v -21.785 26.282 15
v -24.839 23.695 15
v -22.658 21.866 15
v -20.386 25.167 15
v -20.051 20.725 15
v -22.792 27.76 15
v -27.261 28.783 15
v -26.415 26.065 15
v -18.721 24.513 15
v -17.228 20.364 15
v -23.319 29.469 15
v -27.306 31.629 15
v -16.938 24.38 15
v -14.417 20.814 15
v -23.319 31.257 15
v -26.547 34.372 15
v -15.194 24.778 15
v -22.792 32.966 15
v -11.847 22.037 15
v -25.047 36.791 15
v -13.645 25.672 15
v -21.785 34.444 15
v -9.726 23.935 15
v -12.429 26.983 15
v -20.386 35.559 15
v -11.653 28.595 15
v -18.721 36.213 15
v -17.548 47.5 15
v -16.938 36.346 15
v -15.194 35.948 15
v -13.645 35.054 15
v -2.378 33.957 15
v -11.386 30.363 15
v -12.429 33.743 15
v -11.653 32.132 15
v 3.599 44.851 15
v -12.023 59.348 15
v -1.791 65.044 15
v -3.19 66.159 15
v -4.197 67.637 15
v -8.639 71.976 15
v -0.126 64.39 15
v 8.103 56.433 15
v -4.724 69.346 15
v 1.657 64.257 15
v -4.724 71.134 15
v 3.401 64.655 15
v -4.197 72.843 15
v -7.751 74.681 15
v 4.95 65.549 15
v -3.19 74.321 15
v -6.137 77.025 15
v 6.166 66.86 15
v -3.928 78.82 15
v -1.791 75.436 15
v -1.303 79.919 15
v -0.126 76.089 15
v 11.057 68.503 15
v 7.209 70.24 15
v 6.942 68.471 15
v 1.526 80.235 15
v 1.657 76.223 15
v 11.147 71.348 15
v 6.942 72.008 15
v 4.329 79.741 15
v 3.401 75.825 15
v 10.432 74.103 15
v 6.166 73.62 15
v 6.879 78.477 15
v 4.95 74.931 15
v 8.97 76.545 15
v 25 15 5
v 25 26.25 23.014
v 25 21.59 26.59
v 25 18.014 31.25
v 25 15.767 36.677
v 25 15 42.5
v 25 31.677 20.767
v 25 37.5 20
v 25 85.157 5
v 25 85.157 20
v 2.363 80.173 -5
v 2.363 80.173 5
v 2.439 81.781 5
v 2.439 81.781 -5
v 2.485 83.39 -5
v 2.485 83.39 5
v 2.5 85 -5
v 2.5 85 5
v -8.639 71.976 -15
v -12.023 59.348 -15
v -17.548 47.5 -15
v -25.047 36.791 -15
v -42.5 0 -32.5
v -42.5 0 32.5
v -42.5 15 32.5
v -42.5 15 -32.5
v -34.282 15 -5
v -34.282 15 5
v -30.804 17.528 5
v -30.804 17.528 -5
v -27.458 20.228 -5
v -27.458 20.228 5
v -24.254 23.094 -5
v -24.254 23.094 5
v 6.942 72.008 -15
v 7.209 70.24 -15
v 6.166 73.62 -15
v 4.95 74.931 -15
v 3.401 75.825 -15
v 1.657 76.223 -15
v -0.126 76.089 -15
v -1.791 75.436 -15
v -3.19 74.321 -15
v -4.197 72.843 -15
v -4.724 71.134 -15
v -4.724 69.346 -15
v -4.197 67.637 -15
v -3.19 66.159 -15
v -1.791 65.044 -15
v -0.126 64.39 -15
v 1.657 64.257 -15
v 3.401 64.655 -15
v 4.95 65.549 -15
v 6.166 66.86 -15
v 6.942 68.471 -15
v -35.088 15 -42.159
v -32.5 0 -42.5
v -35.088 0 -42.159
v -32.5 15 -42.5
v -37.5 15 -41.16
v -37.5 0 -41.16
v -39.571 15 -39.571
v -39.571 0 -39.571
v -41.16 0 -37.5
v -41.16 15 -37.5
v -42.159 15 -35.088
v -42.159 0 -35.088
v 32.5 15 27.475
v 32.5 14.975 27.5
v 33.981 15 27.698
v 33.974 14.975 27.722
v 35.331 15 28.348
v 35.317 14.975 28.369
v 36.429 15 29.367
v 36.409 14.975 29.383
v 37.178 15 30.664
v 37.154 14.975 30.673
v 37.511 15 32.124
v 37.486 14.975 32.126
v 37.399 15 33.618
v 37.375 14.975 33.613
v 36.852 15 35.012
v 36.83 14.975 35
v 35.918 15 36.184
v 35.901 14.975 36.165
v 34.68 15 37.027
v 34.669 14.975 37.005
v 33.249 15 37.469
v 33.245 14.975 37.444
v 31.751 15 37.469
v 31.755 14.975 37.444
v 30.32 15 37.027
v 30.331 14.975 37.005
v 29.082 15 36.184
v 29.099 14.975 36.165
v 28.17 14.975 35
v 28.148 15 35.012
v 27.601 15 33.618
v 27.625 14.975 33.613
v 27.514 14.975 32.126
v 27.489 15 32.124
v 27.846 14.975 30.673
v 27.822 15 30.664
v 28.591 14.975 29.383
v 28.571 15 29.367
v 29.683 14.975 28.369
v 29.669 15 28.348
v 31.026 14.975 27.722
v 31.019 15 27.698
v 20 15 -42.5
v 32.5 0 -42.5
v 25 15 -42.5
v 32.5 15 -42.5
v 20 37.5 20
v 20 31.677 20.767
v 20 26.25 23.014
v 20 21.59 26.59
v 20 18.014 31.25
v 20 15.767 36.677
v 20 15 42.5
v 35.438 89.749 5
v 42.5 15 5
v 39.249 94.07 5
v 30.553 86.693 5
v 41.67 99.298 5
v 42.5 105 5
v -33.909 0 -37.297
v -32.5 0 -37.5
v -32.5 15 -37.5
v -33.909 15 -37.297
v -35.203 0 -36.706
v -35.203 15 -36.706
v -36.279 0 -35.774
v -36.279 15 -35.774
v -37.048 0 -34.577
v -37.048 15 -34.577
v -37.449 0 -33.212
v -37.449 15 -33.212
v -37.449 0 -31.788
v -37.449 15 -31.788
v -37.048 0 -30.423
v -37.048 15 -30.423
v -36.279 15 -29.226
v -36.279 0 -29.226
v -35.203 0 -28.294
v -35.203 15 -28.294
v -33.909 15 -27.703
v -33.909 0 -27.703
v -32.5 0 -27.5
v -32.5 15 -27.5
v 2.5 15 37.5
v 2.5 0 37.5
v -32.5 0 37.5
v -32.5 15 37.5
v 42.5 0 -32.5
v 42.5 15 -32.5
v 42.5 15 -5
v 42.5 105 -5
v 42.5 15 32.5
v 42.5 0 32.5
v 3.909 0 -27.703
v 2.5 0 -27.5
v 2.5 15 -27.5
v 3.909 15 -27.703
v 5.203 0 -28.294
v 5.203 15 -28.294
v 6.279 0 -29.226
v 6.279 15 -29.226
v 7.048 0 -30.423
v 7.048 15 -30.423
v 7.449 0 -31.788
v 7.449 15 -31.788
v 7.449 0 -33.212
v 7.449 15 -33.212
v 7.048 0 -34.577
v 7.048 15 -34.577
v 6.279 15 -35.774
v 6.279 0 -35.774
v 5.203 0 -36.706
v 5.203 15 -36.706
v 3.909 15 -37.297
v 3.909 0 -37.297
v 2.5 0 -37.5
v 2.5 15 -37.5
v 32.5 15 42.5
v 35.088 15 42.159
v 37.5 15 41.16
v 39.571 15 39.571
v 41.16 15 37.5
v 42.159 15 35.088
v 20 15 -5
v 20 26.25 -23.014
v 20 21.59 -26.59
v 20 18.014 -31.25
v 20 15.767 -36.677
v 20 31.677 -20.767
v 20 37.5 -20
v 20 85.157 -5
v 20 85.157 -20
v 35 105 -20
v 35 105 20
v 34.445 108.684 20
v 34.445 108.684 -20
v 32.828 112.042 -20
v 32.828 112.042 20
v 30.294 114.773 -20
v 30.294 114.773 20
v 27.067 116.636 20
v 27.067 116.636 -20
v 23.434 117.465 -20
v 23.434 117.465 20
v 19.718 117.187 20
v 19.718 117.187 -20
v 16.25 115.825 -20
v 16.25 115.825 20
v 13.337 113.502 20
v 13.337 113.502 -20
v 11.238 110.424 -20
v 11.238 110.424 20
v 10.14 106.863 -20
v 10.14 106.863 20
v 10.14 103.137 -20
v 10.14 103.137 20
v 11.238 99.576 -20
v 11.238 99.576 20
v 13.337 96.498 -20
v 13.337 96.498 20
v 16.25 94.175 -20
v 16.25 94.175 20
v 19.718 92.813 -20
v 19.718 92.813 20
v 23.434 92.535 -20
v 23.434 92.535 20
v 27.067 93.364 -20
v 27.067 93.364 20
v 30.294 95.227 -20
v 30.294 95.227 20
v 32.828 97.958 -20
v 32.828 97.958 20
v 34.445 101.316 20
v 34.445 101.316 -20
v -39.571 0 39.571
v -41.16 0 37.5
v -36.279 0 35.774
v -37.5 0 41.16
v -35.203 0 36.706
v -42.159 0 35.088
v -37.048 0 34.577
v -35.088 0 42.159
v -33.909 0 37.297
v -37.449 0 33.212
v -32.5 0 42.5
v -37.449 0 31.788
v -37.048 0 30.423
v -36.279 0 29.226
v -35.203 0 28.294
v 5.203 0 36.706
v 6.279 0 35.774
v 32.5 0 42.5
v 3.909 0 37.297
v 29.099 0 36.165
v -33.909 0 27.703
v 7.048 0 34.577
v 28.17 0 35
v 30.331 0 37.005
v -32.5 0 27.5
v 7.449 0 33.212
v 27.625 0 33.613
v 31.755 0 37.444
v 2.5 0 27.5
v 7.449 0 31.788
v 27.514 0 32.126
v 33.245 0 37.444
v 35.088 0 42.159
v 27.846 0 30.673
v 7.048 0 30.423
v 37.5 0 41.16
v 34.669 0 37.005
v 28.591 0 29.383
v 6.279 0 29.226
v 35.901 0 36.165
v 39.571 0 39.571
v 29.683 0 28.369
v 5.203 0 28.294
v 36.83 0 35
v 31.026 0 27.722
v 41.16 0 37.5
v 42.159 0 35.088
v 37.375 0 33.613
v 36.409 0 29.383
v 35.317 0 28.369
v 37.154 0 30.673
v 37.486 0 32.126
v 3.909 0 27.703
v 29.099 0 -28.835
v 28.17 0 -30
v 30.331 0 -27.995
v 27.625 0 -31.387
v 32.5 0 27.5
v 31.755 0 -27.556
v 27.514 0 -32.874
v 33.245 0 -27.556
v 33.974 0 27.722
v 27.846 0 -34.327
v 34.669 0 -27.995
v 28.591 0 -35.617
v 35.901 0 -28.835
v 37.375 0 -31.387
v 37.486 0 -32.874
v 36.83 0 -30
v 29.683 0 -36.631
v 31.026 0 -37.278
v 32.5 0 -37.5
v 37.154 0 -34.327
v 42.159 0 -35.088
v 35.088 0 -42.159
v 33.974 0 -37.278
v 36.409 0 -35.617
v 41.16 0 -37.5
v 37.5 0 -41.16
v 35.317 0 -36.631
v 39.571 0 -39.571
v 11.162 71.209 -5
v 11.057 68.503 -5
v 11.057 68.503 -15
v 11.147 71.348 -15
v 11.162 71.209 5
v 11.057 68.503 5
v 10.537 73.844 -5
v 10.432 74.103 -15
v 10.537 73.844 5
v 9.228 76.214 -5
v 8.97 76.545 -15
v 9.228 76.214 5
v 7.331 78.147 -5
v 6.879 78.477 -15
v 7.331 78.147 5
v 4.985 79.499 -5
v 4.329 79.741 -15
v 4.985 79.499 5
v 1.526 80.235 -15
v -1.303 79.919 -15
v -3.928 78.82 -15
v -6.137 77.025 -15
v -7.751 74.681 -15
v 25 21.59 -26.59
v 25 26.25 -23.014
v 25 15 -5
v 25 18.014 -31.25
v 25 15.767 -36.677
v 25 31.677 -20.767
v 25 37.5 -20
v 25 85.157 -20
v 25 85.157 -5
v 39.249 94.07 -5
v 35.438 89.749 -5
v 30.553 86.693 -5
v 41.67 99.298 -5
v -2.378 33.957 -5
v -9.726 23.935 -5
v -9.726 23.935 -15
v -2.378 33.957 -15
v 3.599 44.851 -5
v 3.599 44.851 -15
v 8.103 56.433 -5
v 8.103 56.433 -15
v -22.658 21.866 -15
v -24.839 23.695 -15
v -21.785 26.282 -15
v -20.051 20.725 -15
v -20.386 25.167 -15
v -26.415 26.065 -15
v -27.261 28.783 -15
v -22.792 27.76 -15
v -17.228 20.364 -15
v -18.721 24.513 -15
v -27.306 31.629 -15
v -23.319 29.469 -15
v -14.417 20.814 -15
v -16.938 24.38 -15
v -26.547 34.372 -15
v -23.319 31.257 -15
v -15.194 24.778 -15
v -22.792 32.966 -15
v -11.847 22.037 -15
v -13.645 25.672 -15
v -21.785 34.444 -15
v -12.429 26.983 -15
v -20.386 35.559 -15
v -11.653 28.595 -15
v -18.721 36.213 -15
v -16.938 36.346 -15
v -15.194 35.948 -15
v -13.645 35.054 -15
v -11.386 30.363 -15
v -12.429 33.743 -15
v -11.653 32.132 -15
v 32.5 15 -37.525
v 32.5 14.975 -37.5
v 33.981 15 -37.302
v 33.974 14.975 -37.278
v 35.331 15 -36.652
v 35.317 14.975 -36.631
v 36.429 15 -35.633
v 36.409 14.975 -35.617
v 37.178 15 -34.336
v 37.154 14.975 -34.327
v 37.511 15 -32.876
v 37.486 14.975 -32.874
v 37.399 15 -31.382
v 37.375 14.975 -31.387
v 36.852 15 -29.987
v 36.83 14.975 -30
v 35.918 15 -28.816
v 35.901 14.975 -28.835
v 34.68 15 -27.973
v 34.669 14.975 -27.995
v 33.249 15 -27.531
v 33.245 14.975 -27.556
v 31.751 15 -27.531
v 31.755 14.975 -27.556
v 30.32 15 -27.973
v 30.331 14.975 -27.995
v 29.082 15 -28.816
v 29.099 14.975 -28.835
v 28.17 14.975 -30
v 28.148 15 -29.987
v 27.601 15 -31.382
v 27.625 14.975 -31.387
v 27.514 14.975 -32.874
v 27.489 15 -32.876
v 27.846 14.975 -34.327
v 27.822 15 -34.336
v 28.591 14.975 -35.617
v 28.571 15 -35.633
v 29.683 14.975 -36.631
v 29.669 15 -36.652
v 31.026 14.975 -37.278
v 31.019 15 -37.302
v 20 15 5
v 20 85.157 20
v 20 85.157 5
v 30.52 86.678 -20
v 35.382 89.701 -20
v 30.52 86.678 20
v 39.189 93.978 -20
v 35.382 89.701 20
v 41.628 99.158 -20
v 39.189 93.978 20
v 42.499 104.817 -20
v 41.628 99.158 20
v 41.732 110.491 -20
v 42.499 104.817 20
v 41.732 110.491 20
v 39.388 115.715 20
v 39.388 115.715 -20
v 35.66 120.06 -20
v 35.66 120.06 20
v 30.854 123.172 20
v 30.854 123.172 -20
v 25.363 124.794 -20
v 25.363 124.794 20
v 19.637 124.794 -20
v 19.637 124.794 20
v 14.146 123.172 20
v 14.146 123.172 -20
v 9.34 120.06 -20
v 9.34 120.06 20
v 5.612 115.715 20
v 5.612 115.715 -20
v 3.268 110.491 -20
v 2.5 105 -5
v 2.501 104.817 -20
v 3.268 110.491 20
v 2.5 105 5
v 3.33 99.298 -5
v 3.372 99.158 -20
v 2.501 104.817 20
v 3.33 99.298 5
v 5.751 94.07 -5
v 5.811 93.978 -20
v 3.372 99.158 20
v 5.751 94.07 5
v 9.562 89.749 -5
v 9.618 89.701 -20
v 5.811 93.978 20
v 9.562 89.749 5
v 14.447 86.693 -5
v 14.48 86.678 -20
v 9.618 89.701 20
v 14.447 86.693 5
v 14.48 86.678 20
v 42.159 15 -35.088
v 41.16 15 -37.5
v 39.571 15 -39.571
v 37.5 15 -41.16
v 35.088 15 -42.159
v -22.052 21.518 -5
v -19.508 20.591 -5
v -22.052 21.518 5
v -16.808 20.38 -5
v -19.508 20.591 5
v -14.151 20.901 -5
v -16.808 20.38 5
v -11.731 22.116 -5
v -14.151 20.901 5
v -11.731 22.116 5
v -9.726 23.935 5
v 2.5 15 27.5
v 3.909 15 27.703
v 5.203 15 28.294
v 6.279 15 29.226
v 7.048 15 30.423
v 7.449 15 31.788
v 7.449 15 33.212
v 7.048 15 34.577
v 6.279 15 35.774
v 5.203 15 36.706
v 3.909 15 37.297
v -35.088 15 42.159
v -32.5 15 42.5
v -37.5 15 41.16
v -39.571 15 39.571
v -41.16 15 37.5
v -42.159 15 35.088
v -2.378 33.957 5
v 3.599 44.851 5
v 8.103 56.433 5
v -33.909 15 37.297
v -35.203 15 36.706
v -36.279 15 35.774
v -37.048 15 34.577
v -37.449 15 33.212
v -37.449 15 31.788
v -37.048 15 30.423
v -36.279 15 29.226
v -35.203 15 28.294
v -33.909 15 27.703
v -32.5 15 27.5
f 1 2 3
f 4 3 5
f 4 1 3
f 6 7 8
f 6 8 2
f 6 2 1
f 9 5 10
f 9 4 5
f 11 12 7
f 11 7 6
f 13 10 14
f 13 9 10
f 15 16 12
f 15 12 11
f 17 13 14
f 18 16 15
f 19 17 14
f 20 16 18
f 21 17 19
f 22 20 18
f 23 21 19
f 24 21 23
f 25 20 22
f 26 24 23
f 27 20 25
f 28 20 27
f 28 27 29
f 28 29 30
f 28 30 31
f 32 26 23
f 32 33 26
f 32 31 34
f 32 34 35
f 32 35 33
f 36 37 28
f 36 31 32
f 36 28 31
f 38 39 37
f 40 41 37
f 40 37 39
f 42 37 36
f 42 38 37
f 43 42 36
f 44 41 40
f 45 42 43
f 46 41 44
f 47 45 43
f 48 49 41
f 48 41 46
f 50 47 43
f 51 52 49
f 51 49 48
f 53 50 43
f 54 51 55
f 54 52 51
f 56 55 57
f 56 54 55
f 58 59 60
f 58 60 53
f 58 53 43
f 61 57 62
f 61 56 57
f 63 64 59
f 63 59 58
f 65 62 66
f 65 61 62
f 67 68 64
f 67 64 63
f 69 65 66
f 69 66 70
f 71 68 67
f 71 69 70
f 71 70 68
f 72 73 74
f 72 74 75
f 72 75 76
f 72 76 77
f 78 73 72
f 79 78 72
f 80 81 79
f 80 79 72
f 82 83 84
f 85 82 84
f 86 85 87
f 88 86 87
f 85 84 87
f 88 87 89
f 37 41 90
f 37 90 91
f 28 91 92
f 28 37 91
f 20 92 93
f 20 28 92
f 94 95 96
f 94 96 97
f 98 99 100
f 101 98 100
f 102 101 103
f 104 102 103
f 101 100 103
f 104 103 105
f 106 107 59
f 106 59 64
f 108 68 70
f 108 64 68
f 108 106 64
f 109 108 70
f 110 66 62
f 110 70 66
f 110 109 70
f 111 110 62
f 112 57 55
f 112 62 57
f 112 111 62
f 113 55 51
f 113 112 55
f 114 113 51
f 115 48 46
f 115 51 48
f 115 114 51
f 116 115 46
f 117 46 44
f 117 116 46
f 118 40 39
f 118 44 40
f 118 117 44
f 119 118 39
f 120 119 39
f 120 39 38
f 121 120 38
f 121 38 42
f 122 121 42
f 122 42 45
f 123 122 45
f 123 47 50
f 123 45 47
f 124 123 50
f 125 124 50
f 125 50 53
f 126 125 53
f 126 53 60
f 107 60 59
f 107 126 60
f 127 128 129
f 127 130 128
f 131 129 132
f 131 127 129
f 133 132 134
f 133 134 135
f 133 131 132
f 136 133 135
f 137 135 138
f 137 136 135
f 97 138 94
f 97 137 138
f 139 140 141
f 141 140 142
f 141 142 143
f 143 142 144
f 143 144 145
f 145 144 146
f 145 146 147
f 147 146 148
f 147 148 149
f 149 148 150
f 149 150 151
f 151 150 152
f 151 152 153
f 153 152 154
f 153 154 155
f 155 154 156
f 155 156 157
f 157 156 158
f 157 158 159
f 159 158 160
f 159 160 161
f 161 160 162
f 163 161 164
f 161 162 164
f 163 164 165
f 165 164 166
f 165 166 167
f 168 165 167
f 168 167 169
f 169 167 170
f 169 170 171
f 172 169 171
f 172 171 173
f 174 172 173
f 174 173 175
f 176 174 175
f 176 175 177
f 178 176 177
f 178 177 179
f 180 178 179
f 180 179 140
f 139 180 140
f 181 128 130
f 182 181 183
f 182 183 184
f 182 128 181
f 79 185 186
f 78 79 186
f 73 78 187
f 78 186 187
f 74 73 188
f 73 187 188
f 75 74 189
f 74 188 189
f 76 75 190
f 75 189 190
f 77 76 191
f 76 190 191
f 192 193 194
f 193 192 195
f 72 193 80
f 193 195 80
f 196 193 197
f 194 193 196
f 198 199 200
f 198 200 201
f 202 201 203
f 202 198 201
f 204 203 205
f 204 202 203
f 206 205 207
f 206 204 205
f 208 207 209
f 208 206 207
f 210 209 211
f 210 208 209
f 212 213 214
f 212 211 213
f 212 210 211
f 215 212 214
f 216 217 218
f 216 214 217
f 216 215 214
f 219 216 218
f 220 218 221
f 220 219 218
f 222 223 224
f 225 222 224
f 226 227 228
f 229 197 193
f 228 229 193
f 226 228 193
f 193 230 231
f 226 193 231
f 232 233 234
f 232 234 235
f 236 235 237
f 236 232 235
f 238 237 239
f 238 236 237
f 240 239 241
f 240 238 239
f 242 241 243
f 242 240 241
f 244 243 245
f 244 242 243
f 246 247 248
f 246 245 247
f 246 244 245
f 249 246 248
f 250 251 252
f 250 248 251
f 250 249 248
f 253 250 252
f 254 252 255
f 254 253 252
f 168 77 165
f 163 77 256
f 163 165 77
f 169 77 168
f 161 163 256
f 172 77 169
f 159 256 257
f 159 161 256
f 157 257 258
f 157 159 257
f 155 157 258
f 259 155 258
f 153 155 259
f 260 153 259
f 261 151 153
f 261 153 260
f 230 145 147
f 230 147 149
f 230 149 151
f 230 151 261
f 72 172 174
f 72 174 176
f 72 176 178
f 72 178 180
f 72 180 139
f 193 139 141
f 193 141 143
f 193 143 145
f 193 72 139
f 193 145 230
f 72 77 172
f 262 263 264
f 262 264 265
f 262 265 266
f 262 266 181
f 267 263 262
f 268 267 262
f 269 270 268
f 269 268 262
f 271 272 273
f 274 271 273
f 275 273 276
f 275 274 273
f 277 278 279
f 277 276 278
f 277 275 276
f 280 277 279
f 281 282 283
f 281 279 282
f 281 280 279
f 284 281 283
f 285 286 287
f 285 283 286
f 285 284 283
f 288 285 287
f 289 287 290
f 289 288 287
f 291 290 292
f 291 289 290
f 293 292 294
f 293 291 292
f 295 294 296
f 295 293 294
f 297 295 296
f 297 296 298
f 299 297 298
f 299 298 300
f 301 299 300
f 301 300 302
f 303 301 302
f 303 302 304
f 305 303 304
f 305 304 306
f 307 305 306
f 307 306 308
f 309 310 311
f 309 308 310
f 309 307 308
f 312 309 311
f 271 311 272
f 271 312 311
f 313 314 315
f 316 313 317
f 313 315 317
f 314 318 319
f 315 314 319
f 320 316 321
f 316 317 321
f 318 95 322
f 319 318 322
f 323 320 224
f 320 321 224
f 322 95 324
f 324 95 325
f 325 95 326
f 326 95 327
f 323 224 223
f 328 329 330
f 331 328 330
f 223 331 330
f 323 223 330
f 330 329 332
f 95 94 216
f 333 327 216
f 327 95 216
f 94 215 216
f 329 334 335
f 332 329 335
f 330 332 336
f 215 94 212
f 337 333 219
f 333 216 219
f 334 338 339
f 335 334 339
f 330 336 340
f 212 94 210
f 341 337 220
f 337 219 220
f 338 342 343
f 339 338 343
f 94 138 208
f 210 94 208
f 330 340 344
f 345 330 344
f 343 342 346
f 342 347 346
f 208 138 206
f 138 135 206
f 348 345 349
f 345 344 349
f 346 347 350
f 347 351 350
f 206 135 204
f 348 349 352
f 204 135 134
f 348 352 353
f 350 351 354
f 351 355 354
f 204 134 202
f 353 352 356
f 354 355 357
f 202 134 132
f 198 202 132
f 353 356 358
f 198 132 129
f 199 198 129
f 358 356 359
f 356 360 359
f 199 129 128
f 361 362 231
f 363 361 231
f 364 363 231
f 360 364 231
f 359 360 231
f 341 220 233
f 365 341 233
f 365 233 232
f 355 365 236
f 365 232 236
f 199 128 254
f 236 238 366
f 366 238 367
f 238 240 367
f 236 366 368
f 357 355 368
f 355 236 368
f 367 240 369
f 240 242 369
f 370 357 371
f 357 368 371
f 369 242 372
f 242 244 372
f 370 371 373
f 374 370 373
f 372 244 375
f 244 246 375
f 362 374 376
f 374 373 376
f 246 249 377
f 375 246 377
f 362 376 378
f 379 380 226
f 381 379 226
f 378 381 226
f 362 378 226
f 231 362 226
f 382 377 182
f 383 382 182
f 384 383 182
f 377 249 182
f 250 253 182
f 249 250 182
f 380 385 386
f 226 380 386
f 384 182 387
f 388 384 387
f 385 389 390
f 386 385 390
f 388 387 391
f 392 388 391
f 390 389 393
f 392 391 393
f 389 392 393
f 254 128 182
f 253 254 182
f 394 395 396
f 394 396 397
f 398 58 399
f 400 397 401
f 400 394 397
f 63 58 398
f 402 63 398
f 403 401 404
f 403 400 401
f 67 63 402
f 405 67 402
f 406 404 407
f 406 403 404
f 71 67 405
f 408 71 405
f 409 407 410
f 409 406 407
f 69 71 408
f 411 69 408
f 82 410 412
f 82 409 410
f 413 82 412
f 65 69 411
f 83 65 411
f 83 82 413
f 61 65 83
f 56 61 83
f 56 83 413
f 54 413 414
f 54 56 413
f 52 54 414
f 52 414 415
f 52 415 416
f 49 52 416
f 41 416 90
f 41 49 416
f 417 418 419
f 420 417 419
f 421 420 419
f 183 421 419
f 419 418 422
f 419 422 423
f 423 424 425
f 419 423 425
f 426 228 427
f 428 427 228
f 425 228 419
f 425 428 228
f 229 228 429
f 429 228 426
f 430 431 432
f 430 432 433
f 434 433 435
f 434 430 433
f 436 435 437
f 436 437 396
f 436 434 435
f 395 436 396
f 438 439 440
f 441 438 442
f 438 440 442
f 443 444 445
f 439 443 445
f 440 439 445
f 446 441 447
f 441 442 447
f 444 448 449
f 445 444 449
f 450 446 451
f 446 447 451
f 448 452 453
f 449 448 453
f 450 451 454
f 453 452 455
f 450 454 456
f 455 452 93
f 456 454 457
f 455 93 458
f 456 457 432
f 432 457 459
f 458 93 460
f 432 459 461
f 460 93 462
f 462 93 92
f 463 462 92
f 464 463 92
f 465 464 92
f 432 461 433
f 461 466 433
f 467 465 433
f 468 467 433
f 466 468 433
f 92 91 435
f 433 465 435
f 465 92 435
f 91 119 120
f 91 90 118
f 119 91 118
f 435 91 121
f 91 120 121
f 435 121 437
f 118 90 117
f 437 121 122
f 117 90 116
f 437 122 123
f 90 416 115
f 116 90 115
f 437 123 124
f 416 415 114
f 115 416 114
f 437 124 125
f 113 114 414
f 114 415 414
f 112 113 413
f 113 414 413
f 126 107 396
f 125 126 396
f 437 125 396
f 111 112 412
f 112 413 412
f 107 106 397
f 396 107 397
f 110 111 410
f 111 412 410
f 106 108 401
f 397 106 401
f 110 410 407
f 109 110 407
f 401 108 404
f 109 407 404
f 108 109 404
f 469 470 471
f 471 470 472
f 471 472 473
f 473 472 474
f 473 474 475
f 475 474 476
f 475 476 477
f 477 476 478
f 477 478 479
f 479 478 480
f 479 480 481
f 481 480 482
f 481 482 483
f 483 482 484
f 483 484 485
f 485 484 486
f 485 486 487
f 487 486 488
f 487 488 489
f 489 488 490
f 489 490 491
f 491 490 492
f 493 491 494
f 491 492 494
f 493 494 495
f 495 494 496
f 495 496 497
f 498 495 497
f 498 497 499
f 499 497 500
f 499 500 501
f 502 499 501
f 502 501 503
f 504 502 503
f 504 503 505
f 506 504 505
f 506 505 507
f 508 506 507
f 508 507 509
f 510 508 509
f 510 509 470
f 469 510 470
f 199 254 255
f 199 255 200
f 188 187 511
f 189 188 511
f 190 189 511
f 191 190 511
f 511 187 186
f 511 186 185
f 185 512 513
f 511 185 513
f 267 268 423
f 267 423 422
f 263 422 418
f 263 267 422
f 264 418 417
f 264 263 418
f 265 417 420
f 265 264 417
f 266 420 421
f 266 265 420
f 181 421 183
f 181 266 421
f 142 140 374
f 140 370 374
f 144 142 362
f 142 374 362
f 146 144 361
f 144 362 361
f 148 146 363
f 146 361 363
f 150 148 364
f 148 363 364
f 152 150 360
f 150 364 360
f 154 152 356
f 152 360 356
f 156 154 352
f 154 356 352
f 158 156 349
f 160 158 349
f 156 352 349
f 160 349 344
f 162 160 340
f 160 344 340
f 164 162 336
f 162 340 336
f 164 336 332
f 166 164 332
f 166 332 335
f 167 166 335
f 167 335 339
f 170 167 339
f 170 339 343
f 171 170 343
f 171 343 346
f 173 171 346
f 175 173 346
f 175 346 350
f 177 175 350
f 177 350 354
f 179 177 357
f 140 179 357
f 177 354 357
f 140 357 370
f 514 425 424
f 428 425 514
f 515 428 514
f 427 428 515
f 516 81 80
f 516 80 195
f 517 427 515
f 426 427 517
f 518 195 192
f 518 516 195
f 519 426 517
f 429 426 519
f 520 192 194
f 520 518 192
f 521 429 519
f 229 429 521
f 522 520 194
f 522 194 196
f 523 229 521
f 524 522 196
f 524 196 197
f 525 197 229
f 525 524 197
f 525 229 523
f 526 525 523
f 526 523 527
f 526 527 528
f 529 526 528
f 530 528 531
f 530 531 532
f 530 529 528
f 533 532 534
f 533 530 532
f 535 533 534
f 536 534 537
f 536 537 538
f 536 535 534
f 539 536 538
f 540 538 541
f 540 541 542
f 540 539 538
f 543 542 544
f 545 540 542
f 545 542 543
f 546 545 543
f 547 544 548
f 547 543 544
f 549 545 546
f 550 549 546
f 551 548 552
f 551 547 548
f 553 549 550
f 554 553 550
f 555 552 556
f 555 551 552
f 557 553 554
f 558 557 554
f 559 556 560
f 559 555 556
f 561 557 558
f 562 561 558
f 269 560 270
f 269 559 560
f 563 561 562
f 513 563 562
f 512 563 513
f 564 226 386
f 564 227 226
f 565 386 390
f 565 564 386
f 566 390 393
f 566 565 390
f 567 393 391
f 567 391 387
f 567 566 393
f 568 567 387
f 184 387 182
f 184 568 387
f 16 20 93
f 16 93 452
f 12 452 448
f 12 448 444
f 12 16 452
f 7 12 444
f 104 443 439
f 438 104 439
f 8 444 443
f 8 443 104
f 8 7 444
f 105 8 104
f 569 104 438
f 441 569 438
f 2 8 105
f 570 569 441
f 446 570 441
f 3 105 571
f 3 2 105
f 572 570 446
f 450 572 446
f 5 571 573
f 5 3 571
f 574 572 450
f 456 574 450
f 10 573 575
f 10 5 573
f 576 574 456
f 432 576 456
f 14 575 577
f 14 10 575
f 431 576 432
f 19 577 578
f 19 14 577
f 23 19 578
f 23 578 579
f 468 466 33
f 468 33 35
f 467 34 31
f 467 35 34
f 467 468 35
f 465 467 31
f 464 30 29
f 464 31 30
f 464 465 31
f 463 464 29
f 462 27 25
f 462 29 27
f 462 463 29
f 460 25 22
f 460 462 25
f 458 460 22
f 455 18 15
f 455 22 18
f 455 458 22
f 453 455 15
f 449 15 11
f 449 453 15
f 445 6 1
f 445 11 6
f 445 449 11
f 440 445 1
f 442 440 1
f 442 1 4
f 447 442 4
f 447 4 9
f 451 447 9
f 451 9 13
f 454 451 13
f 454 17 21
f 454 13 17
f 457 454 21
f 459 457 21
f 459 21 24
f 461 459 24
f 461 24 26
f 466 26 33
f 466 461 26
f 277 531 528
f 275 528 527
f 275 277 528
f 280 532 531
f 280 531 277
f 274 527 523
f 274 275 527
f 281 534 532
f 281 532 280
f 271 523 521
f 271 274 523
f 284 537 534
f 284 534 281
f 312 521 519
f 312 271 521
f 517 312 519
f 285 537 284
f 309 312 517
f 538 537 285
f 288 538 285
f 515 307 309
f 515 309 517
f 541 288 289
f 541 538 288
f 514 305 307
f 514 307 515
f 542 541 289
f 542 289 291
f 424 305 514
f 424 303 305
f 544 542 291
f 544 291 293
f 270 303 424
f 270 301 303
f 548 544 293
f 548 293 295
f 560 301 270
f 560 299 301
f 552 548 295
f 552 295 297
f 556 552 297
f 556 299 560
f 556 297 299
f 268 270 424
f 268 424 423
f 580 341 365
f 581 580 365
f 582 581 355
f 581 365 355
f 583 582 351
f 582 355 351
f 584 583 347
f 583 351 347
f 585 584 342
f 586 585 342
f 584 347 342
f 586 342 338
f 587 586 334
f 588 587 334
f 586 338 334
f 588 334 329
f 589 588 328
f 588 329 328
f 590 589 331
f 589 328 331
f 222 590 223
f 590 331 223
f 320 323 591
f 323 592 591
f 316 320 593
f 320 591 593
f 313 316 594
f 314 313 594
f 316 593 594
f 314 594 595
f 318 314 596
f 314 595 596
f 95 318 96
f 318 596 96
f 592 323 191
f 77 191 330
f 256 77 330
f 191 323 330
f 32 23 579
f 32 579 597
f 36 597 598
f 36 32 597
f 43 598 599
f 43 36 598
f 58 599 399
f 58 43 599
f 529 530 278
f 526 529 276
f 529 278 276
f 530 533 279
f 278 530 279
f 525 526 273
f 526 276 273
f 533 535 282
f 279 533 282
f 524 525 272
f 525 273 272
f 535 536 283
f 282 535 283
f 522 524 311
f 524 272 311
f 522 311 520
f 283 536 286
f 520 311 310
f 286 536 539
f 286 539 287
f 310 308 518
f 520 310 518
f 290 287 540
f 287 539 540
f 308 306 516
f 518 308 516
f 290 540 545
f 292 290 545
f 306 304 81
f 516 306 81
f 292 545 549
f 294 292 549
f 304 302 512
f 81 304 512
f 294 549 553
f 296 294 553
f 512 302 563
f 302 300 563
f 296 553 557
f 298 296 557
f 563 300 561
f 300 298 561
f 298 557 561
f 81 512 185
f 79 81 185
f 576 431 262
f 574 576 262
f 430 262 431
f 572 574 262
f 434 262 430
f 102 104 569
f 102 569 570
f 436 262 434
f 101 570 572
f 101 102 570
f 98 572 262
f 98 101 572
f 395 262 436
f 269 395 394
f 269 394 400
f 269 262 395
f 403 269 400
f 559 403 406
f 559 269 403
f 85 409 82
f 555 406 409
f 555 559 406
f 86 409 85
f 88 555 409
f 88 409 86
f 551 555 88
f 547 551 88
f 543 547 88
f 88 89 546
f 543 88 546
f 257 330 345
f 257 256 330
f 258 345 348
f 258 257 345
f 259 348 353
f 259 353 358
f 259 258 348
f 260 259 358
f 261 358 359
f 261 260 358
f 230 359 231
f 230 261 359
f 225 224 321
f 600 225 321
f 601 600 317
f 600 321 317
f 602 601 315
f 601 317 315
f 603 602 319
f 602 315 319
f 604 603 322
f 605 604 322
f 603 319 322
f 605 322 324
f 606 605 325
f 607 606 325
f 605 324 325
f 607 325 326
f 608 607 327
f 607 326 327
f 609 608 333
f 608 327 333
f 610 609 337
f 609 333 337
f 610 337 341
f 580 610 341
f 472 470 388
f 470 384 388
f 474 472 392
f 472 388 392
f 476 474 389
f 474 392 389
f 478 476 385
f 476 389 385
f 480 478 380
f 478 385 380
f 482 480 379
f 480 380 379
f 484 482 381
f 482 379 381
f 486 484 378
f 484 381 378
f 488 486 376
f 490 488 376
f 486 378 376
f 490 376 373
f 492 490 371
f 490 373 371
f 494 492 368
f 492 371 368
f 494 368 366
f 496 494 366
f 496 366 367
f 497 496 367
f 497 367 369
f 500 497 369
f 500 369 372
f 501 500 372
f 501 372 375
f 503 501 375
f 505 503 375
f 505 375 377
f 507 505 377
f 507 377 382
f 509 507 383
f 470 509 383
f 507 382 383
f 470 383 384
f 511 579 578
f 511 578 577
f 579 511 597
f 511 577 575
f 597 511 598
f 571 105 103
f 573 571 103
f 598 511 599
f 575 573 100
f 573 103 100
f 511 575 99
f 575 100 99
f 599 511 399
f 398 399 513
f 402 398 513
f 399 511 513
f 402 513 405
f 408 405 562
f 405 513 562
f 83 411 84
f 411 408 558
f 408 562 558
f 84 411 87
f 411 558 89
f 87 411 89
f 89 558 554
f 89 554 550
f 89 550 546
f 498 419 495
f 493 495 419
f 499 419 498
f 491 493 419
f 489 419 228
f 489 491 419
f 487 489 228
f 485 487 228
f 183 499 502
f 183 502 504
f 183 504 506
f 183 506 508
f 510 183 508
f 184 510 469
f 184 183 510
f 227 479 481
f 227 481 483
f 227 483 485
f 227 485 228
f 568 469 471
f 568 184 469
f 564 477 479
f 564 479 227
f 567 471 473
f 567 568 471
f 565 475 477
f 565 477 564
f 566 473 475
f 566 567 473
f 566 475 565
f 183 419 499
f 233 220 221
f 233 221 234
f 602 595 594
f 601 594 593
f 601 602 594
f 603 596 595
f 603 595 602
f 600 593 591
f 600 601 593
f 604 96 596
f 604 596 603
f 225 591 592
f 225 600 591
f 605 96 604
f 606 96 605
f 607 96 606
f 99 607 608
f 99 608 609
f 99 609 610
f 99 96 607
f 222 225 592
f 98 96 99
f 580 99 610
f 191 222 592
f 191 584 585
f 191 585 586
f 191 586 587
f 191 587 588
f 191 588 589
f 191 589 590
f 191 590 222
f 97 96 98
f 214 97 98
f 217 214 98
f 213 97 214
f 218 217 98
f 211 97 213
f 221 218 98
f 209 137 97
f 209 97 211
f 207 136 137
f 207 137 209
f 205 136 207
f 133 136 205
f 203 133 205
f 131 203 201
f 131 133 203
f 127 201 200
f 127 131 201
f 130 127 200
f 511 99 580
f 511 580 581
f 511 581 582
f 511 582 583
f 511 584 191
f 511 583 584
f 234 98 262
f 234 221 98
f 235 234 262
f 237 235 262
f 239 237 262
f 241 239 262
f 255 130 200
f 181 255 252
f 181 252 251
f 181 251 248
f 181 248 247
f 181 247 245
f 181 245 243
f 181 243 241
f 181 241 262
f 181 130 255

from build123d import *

# Parameters (mm, degrees)
SKETCH1_W                            = 85
SKETCH1_H                            = 85
BOSS_EXTRUDE1_DEPTH                  = 15
SKETCH2_R                            = 20
BOSS_EXTRUDE2_DEPTH                  = 20
BOSS_EXTRUDE3_DEPTH                  = 5
BOSS_EXTRUDE4_DEPTH                  = 15
RIB1_START                           = -2.5
RIB1_DEPTH                           = 5
FILLET1_R                            = 10
F_10_0_10_DIAMETER_HOLE1_D           = 10
F_10_0_10_DIAMETER_HOLE1_CSINK_D     = 10.05
F_10_0_10_DIAMETER_HOLE1_CSINK_ANGLE = 90
CUT_EXTRUDE1_DEPTH                   = 126.349511367
CUT_EXTRUDE1_DEPTH_BACK              = 126.349511367
CUT_EXTRUDE2_DEPTH                   = 145.005208239
CUT_EXTRUDE2_DEPTH_BACK              = 145.005208239
SKETCH9_R                            = 12.5
SKETCH9_R_2                          = 6


with BuildPart() as part:
    # Sketch1 → Boss-Extrude1 (new body)
    with BuildSketch(Plane(origin=(0, 0, 0), x_dir=(1, 0, 0), z_dir=(0, 1, 0))):
        Rectangle(SKETCH1_W, SKETCH1_H)
    extrude(amount=BOSS_EXTRUDE1_DEPTH)



with BuildPart() as body_2:
    # Sketch2 → Boss-Extrude2 (new, symmetric)
    with BuildSketch(Plane.XY):
        with Locations((22.5, 105)):
            Circle(SKETCH2_R)
    extrude(amount=BOSS_EXTRUDE2_DEPTH, both=True)


with BuildPart() as part_1:
    add(part.part)

    add(body_2.part)  # Boss-Extrude3 merges body 2
    # Sketch4 → Boss-Extrude3 (add, symmetric)
    with BuildSketch(Plane.XY):
        with BuildLine():
            Line((42.5, 105), (42.5, 15))
            Line((42.5, 15), (-34.281746195, 15))
            ThreePointArc((-34.281746195, 15), (-7.255227512, 45.462369655), (2.5, 85))
            Line((2.5, 85), (2.5, 105))
            ThreePointArc((2.5, 105), (22.5, 85), (42.5, 105))
        make_face()
    extrude(amount=BOSS_EXTRUDE3_DEPTH, both=True)

    # Sketch5 → Boss-Extrude4 (add, symmetric)
    with BuildSketch(Plane.XY):
        with BuildLine():
            ThreePointArc((-9.725777904, 23.93517708), (3.599239768, 44.851265135), (11.056736536, 68.503423122))
            ThreePointArc((11.056736536, 68.503423122), (2.945140783, 80.087982428), (-8.639418524, 71.976386675))
            ThreePointArc((-8.639418524, 71.976386675), (-14.526915972, 53.303630369), (-25.046666766, 36.790929274))
            ThreePointArc((-25.046666766, 36.790929274), (-23.814098432, 22.702608745), (-9.725777904, 23.93517708))
        make_face()
    extrude(amount=BOSS_EXTRUDE4_DEPTH, both=True)

    # Rib1: read off the stored shape, not the designer's step
    # Rib1 outline → Rib1 (add)
    with BuildSketch(Plane(origin=(22.5, 0, 0), x_dir=(0, 0, -1), z_dir=(1, 0, 0)).offset(RIB1_START)):
        with BuildLine():
            Line((-5, 15), (-5, 85.156865167))
            Line((-5, 85.156865167), (-20, 85.156865167))
            Line((-20, 85.156865167), (-20, 37.5))
            ThreePointArc((-20, 37.5), (-26.590097423, 21.590097423), (-42.5, 15))
            Line((-42.5, 15), (-5, 15))
        make_face()
    rib1 = extrude(amount=RIB1_DEPTH)

    # Mirror1: Rib1 across plane
    add(rib1.mirror(Plane.XY))

    # Fillet1
    fillet1_edges = [part_1.edges().sort_by_distance(p)[0] for p in [
        (42.5, 7.5, 42.5),
        (-42.5, 7.5, 42.5),
        (-42.5, 7.5, -42.5),
        (42.5, 7.5, -42.5),
    ]]
    fillet(fillet1_edges, radius=FILLET1_R)

    # Ø10.0 (10) Diameter Hole1 (through all)
    with Locations(Plane(origin=(32.5, 15, -32.5), x_dir=(0, 0, 1), z_dir=(0, 1, 0))):
        with Locations((0, 0), (65, 0)):
            CounterSinkHole(F_10_0_10_DIAMETER_HOLE1_D / 2, F_10_0_10_DIAMETER_HOLE1_CSINK_D / 2, counter_sink_angle=F_10_0_10_DIAMETER_HOLE1_CSINK_ANGLE)

    # Sketch8 → Cut-Extrude1 (cut, two sides: drawn at the far end of the back side and taken through both)
    with BuildSketch(Plane(origin=(0, 15, 0), x_dir=(1, 0, 0), z_dir=(0, 1, 0)).offset(-CUT_EXTRUDE1_DEPTH_BACK)):
        with BuildLine():
            Line((-32.5, -27.5), (2.5, -27.5))
            ThreePointArc((2.5, -27.5), (7.5, -32.5), (2.5, -37.5))
            Line((2.5, -37.5), (-32.5, -37.5))
            ThreePointArc((-32.5, -37.5), (-37.5, -32.5), (-32.5, -27.5))
        make_face()
        with BuildLine():
            Line((-32.5, 27.5), (2.5, 27.5))
            ThreePointArc((2.5, 27.5), (7.5, 32.5), (2.5, 37.5))
            Line((2.5, 37.5), (-32.5, 37.5))
            ThreePointArc((-32.5, 37.5), (-37.5, 32.5), (-32.5, 27.5))
        make_face()
    extrude(amount=CUT_EXTRUDE1_DEPTH + CUT_EXTRUDE1_DEPTH_BACK, mode=Mode.SUBTRACT)

    # Sketch9 → Cut-Extrude2 (cut, two sides: drawn at the far end of the back side and taken through both)
    with BuildSketch(Plane.XY.offset(15).offset(-CUT_EXTRUDE2_DEPTH_BACK)):
        with Locations((22.5, 105)):
            Circle(SKETCH9_R)
        with Locations((1.208659006, 70.239904898)):
            Circle(SKETCH9_R_2)
        with Locations((-17.386222335, 30.363053177)):
            Circle(SKETCH9_R_2)
    extrude(amount=CUT_EXTRUDE2_DEPTH + CUT_EXTRUDE2_DEPTH_BACK, mode=Mode.SUBTRACT)


solid = part_1.part
